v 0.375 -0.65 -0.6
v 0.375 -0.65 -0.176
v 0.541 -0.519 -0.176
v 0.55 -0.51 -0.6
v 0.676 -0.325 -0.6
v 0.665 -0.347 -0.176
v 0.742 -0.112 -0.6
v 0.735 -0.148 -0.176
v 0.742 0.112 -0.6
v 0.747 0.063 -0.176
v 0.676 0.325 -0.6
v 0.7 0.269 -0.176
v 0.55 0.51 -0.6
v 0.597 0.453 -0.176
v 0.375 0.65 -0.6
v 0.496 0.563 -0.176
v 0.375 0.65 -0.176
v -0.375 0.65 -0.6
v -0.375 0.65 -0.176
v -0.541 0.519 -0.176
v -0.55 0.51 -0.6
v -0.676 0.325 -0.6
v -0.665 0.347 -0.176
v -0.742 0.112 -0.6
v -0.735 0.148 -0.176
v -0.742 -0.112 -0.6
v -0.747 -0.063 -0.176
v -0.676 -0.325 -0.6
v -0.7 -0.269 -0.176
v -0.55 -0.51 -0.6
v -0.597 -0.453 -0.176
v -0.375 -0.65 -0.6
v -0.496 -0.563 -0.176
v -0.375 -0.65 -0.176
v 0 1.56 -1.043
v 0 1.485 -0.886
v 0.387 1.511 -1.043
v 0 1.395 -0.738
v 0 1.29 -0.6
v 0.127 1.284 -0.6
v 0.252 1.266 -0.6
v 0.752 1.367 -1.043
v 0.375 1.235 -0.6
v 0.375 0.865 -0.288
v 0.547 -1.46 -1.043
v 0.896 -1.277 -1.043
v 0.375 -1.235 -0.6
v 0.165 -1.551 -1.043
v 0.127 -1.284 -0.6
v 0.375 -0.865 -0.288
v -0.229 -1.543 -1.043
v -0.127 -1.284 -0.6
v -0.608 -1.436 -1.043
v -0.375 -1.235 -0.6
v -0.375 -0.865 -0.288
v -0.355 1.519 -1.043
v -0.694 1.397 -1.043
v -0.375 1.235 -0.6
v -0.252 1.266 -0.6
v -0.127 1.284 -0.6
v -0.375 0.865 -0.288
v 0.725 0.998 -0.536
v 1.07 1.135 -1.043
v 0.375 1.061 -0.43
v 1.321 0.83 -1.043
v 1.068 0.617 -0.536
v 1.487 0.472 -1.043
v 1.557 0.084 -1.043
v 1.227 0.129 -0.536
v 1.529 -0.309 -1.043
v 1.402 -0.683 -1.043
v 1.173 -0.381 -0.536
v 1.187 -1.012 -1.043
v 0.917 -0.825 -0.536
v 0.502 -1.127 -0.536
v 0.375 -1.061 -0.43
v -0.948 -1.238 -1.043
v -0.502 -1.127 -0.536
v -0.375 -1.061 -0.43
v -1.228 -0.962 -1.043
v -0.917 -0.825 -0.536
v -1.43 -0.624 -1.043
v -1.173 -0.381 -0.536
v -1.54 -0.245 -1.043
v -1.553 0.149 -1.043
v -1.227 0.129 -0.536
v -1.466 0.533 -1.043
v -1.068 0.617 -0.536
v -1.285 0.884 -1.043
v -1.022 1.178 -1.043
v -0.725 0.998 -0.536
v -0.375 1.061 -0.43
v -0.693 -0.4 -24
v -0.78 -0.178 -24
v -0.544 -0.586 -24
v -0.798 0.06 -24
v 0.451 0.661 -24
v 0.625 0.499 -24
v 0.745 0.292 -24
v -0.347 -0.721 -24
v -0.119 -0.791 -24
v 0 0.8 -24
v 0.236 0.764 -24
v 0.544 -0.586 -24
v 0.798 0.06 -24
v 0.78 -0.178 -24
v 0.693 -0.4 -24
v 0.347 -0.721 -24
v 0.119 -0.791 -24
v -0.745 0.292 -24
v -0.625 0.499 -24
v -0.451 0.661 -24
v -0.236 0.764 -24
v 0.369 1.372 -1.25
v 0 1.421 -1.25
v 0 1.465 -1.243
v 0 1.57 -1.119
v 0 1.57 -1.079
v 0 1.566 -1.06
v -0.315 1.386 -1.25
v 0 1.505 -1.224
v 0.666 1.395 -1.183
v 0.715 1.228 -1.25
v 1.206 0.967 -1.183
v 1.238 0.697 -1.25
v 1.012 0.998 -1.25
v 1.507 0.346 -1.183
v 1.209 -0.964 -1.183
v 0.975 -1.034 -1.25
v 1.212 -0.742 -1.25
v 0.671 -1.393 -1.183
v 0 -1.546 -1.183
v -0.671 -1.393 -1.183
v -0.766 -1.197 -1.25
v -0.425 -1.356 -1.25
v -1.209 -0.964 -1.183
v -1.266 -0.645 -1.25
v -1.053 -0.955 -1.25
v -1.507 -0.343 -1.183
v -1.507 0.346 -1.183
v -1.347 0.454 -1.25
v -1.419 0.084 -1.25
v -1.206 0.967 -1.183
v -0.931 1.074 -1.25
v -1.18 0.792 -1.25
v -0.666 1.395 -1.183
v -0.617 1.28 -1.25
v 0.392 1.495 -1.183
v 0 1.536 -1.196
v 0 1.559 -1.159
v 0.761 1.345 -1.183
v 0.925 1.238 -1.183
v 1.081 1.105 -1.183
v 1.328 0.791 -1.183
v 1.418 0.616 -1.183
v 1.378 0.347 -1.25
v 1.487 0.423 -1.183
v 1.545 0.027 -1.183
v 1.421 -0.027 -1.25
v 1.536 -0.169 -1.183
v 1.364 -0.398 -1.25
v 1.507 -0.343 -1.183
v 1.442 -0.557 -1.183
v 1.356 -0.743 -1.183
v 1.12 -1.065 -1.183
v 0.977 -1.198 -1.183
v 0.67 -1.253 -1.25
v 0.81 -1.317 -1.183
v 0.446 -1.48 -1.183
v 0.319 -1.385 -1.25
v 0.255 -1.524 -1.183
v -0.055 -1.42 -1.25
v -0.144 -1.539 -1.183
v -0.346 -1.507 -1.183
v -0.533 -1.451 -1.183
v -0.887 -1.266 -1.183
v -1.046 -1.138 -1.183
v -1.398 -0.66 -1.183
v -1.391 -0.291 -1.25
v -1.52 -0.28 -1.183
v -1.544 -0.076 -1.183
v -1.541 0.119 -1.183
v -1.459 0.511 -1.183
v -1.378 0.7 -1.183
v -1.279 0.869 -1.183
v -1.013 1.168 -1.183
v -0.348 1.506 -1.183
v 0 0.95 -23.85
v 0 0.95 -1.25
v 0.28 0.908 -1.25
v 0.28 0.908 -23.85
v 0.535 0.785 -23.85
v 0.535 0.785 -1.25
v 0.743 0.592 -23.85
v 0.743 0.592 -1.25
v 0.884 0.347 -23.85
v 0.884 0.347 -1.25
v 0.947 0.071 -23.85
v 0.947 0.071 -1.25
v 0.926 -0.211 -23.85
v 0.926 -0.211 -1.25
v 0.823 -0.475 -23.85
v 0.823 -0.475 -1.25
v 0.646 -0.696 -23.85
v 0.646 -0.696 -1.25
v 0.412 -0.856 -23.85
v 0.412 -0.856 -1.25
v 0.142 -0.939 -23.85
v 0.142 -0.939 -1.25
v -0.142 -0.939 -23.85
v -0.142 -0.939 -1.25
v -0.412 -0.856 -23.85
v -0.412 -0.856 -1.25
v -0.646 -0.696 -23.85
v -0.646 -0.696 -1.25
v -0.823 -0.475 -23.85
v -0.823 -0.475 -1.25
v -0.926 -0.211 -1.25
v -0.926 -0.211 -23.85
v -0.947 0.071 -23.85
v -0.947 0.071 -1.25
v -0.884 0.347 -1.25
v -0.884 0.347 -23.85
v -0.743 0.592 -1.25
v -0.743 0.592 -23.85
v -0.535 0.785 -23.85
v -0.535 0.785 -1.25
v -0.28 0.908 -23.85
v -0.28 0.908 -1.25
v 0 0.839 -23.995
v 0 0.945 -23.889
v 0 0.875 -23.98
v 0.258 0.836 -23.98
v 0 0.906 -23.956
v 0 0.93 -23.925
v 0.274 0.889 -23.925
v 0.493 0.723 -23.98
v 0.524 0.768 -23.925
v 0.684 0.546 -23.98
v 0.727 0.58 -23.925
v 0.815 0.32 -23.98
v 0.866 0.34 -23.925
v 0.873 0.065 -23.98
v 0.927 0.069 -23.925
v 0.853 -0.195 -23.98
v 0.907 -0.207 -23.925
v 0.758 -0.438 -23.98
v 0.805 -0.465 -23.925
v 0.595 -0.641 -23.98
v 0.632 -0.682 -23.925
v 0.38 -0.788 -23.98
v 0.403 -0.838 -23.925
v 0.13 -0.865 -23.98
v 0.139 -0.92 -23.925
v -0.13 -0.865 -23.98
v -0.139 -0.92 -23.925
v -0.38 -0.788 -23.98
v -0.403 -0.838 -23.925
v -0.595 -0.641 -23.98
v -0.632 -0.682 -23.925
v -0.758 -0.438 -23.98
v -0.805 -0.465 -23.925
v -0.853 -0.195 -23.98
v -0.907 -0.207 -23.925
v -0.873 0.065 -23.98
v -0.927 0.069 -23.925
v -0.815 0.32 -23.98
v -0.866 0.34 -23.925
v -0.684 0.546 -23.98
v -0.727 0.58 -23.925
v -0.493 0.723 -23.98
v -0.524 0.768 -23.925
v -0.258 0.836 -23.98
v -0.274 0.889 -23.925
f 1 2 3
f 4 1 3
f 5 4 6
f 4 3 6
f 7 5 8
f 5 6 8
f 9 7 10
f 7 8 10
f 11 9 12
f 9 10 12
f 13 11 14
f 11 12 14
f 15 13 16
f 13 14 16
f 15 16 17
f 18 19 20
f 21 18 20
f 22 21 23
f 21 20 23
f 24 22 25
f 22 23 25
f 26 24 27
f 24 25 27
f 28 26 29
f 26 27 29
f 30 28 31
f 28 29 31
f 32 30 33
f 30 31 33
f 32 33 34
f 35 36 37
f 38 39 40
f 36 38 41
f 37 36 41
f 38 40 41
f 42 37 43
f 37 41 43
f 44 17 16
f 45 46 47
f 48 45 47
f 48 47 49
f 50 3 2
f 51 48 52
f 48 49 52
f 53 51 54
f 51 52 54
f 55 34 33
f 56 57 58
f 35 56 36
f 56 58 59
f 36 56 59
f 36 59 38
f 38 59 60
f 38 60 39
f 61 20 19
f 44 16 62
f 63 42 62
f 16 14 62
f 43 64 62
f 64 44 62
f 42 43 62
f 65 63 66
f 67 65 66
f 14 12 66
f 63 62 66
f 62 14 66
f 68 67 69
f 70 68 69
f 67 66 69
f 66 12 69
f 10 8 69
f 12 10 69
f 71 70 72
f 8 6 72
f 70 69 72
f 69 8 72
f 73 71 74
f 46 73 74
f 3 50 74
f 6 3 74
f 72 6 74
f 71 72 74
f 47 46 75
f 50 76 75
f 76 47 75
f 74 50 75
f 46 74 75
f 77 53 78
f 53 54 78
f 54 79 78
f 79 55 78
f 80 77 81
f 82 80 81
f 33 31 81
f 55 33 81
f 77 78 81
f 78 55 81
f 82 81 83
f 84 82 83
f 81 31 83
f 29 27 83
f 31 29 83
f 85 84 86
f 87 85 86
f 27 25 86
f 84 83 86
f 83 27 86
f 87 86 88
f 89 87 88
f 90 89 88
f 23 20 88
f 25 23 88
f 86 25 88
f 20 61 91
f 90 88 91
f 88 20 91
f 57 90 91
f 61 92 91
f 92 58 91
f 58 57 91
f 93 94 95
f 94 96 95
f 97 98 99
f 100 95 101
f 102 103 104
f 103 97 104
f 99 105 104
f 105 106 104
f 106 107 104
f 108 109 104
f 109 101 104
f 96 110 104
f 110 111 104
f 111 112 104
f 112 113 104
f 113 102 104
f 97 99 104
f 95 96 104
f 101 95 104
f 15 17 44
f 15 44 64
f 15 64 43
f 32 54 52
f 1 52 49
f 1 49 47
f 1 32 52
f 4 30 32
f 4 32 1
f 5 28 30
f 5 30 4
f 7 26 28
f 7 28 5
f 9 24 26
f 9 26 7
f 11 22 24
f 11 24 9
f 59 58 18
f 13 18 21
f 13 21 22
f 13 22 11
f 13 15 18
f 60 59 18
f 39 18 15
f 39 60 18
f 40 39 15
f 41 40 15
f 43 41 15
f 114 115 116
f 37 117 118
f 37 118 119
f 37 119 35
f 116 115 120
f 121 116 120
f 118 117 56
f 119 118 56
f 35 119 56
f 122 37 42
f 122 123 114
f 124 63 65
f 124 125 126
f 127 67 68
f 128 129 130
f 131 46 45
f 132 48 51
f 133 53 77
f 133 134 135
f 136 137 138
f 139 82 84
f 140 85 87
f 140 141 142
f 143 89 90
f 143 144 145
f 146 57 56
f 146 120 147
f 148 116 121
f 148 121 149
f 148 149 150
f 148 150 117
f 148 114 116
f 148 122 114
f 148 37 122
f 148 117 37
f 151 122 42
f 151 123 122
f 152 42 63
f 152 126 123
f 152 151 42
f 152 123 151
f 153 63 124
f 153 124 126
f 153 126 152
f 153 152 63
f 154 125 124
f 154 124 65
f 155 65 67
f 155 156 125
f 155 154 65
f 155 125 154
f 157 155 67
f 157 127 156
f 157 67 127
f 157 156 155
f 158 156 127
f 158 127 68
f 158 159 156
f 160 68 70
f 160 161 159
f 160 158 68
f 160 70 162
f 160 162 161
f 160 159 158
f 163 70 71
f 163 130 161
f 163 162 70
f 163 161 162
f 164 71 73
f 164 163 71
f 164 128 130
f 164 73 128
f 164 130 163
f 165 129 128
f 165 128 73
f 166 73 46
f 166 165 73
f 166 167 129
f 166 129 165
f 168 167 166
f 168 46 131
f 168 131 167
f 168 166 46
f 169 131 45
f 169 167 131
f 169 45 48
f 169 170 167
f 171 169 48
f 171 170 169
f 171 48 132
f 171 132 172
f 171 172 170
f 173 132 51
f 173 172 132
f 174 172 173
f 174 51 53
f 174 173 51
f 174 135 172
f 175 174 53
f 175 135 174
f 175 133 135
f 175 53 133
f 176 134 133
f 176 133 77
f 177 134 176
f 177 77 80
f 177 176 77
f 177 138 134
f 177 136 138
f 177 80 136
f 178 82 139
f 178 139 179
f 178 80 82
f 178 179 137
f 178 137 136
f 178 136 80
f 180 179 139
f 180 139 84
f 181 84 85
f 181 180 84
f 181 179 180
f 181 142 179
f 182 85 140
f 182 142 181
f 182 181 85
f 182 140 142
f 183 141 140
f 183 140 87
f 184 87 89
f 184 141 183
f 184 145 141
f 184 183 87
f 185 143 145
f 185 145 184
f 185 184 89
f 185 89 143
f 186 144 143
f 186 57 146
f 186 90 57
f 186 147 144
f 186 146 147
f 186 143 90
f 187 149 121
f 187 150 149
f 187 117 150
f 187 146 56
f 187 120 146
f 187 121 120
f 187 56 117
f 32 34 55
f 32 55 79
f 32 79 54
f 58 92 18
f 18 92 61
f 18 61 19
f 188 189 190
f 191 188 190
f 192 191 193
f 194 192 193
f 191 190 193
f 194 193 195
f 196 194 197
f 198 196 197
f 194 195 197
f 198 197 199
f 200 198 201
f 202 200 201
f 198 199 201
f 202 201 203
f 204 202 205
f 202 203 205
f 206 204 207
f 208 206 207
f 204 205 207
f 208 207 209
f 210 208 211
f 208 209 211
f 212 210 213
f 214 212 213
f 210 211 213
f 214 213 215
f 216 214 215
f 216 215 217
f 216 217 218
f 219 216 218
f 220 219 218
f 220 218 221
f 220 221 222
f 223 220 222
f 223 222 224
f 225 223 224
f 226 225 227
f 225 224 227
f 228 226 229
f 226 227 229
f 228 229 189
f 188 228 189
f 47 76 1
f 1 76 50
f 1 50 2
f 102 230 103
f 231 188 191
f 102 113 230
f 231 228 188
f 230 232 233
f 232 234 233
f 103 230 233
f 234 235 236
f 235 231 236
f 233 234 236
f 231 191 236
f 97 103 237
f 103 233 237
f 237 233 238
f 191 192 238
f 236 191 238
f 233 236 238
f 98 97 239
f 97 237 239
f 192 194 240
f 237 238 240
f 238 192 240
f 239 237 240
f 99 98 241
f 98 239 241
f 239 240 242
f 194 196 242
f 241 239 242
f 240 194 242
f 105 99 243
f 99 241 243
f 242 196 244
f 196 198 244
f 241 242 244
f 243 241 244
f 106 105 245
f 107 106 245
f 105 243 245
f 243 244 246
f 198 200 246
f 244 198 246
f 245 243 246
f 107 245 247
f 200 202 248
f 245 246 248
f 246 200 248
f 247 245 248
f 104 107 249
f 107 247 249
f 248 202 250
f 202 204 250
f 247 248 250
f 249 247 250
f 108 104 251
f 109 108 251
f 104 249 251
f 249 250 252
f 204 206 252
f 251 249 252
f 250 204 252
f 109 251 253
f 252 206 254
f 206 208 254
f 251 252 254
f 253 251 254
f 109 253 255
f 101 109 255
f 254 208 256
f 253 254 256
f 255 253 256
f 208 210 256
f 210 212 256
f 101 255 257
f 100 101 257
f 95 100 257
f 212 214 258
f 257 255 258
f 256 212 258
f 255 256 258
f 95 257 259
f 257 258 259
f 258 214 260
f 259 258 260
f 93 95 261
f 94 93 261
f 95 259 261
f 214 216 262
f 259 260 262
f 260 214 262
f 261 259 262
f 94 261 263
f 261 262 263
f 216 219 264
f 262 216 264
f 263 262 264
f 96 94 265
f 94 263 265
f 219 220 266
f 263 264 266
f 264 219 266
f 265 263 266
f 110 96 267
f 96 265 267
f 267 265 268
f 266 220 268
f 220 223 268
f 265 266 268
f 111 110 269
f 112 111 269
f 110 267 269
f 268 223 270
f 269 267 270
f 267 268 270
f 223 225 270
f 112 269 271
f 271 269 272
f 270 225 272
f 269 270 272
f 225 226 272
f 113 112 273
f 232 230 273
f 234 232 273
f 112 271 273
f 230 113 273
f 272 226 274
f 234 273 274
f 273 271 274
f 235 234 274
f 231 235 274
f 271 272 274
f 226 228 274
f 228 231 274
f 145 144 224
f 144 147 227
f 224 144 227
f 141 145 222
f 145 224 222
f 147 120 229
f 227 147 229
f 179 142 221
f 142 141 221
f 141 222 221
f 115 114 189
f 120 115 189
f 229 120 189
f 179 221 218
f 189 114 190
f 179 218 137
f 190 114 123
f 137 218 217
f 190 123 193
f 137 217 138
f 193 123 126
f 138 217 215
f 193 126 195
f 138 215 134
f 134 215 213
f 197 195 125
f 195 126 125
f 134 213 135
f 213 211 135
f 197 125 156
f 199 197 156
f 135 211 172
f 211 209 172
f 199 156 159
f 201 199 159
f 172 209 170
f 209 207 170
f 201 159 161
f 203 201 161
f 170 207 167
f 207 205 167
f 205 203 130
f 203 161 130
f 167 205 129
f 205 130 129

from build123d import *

# Parameters (mm, degrees)
CUT_EXTRUDE1_DEPTH = 0.6
FILLET1_R          = 0.15


with BuildPart() as part:
    # Sketch4 → Revolve2 (revolve)
    with BuildSketch(Plane(origin=(0, 0, 0), x_dir=(0, 0, -1), z_dir=(1, 0, 0))):
        with BuildLine():
            Line((0, 0), (24, 0))
            Line((24, 0), (24, 0.95))
            Line((24, 0.95), (1.25, 0.95))
            Line((1.25, 0.95), (1.25, 1.63))
            ThreePointArc((1.25, 1.63), (0.348475184, 1.027058908), (0, 0))
        make_face()
    revolve(axis=Axis((0, 0, 0), (0, 0, -1)))

    # Sketch5 → Cut-Extrude1 (cut)
    with BuildSketch(Plane.XY):
        with BuildLine():
            Line((-0.375, -0.649519053), (-0.375, -1.87097888))
            Line((-0.375, -1.87097888), (0.375, -1.87097888))
            Line((0.375, -1.87097888), (0.375, -0.649519053))
            ThreePointArc((0.375, -0.649519053), (0.75, 0), (0.375, 0.649519053))
            Line((0.375, 0.649519053), (0.375, 1.87097888))
            Line((0.375, 1.87097888), (-0.375, 1.87097888))
            Line((-0.375, 1.87097888), (-0.375, 0.649519053))
            ThreePointArc((-0.375, 0.649519053), (-0.75, 0), (-0.375, -0.649519053))
        make_face()
    extrude(amount=-CUT_EXTRUDE1_DEPTH, mode=Mode.SUBTRACT)

    # Fillet1
    fillet1_edges = [part.edges().sort_by_distance(p)[0] for p in [
        (0, -1.63, -1.25),
        (0, -0.95, -24),
    ]]
    fillet(fillet1_edges, radius=FILLET1_R)


solid = part.part
